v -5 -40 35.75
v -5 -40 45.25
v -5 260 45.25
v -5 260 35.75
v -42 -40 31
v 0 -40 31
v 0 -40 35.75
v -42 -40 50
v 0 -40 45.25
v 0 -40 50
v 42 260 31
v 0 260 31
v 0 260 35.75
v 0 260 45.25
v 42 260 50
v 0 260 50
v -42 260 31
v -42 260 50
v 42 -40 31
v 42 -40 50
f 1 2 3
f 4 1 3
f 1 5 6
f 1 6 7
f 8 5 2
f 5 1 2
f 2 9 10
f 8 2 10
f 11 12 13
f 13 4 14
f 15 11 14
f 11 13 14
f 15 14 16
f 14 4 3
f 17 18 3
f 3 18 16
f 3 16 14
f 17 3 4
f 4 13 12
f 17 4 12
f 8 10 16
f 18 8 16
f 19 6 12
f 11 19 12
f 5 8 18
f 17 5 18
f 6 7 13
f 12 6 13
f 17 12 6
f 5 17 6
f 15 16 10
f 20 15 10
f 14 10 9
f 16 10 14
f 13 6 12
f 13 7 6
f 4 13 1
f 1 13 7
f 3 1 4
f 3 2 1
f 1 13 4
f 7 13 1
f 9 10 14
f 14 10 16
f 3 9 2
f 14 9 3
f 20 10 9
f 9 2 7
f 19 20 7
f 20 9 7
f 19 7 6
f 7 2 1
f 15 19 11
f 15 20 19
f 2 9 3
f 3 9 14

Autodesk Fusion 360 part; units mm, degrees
sketch "Base" plane through (0, 0, 0) normal (1, 0, 0) x (0, 1, 0)
  line L0 (-40, 50) -> (260, 50)
  line L1 (260, 50) -> (260, 31)
  line L2 (260, 31) -> (-40, 31)
  line L3 (-40, 31) -> (-40, 50)
  dimension "d4" = 300
  dimension "d5" = 19
extrude "Extrude1" add sketch "Base" against normal blind 42 makes body 1
copy_body "Body->Comp1" bodies 1 removing the originals makes body 2 in component "First Piece"
sketch "Cut" plane through (0, 0, 0) normal (1, 0, 0) x (0, 1, 0)
  line L0 (-40, 31) -> (260, 31)
  line L1 (260, 31) -> (260, 50)
  line L2 (260, 50) -> (-40, 50)
  line L3 (-40, 50) -> (-40, 31)
  line L4 (-40, 45.25) -> (260, 45.25)
  line L5 (260, 45.25) -> (260, 35.75)
  line L6 (260, 35.75) -> (-40, 35.75)
  line L7 (-40, 35.75) -> (-40, 45.25)
  dimension "d8" = 300
  dimension "d9" = 9.5
extrude "Extrude1'" cut sketch "Cut" against normal blind 5 contours L1 L3 L4 L5 L6 L7 bodies 2 in component "First Piece"
extrude "Extrude1''" add sketch "Cut" against normal blind 5 separate body contours L1 L3 L4 L5 L6 L7 makes body 3 in component "Second Piece"
extrude "Extrude2" add sketch "Cut" along normal blind 42 bodies 3 in component "Second Piece"
component "First Piece" placed x (1, 0, 0) y (0, 1, 0) z (0, 0, 1) at (0, 0, 0)
component "Second Piece" placed x (1, 0, 0) y (0, 1, 0) z (0, 0, 1) at (0, 0, 0)
equation "length = 300 mm"
equation "width = 42 mm"
equation "thickness = 19 mm"
equation "d4 = length"
equation "d5 = thickness"
equation "d6 = -width"
equation "d8 = length"
equation "d9 = thickness / 2"
equation "d14 = width"
